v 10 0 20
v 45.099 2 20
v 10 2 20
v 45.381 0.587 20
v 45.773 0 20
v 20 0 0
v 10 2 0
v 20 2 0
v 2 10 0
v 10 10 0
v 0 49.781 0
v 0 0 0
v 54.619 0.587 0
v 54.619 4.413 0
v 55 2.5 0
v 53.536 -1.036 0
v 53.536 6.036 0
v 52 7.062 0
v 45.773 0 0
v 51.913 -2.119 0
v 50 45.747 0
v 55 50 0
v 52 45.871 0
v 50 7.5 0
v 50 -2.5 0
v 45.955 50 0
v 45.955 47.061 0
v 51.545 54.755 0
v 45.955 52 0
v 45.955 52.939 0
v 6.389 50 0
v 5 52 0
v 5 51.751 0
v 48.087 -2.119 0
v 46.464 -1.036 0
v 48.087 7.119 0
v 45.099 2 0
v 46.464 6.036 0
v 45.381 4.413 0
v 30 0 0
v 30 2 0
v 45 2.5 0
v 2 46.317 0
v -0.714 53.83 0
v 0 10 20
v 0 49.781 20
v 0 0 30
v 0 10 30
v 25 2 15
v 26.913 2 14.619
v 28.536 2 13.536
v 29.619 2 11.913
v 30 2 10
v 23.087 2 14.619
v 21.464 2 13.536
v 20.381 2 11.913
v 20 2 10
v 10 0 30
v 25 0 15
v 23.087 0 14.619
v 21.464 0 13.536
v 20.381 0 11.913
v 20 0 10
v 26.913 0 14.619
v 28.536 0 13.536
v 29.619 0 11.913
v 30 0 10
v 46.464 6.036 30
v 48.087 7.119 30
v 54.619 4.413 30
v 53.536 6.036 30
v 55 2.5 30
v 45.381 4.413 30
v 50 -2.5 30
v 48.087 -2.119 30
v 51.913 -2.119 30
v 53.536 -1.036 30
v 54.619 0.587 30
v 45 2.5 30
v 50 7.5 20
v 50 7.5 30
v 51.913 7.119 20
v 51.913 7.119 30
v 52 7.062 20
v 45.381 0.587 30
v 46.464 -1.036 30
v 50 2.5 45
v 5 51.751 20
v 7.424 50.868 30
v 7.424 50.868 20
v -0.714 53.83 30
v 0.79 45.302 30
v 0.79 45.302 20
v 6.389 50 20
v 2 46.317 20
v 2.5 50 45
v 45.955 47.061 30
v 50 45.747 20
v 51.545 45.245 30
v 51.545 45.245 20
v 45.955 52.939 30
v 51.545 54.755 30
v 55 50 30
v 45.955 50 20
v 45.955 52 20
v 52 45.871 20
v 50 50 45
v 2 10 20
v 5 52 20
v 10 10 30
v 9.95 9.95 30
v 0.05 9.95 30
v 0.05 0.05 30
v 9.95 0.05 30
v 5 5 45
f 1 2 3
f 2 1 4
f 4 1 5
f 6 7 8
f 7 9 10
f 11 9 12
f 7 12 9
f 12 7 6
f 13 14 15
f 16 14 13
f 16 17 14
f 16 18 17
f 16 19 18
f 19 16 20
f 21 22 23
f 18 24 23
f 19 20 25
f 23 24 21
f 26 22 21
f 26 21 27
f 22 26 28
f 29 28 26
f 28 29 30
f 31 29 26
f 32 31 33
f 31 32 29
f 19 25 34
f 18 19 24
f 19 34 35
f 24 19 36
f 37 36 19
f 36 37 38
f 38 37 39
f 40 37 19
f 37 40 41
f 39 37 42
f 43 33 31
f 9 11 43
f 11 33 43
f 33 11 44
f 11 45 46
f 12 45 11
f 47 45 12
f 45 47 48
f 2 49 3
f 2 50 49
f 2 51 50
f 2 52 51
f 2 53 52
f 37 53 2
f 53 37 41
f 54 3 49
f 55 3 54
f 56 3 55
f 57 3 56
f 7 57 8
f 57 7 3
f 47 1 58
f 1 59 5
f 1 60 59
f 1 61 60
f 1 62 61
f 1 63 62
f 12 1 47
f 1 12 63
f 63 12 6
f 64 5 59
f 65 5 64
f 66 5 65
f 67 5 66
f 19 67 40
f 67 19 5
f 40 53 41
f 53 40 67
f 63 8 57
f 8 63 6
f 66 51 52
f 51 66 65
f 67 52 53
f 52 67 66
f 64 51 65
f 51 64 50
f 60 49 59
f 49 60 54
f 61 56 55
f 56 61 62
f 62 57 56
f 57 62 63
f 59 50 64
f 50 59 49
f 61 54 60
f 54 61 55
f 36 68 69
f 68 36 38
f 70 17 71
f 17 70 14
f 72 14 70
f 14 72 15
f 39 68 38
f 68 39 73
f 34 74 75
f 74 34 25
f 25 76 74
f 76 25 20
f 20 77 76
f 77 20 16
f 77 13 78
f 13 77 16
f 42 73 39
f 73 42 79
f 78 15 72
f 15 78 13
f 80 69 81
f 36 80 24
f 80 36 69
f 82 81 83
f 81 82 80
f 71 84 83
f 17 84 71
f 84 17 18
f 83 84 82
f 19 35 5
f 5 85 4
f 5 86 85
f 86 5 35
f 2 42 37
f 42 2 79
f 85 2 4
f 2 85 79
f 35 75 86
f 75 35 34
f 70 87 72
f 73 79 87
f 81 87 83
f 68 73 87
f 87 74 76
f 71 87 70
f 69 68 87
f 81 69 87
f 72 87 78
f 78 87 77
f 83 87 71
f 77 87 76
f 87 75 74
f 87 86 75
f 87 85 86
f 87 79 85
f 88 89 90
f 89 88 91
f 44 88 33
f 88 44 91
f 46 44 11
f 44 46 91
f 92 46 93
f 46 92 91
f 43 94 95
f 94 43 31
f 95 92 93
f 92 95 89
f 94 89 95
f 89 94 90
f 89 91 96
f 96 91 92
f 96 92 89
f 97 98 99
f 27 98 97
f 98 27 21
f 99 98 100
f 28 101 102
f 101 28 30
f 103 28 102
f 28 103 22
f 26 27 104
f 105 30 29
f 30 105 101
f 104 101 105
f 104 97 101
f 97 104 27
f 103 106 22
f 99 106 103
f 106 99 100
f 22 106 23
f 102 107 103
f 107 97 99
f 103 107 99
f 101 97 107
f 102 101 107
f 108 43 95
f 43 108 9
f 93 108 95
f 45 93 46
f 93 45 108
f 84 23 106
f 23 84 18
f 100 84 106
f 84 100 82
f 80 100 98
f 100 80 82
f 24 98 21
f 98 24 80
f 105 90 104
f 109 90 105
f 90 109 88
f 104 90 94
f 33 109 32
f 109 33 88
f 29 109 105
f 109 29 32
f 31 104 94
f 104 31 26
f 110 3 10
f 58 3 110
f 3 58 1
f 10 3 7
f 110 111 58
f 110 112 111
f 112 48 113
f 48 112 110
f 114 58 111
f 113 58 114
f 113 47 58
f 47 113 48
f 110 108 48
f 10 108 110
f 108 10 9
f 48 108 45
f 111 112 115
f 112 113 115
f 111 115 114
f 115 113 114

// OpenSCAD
/* [Global] */

circularTowerHeight=30;
squareTowerHeight=30;//[20:50]
triangleTowerHeight=30;//[20:50]
pentagonTowerHeight=30;//[20:50]

/* [Hidden] */

//wall
cube([2,50,20]);

translate([50,5,0])
	cube([2,47,20]);

translate([5,50,0])
	cube([47,2,20]);

//door
difference()
{
cube([50,2,20]);
	translate([20,0,0])
		cube([10,2,10]);


	translate([25,2.5,10])
		rotate([90,0,0])
			cylinder(r1=5,r2=5,h=4,$fn=0);
}

//circle tower
translate([50,2.5,0])
{
	cylinder(r1=5,r2=5,h=circularTowerHeight,$fn=0);
	translate([0,0,circularTowerHeight])
		cylinder(r1=5,r2=0,h=15,$fn=0);
}

// triangleTower
translate([2.5,50,0])
{
	rotate([0,0,10])
	cylinder(r1=5,r2=5,h=triangleTowerHeight,$fn=3);

	rotate([0,0,10])
	translate([0,0,triangleTowerHeight])
	cylinder(r1=5,r2=0,h=15,$fn=3);
}
	

//pentagontower
translate([50,50,0])
{
	cylinder(r1=5,r2=5,h=pentagonTowerHeight,$fn=5);
	translate([0,0,pentagonTowerHeight])
		cylinder(r1=5,r2=0,h=15,$fn=5);
}

//square tower
{
cube([10,10,squareTowerHeight]);

translate([5,5,squareTowerHeight])
	rotate([0,0,45])
		cylinder(r1=7,r2=0,h=15,$fn=4);
}
